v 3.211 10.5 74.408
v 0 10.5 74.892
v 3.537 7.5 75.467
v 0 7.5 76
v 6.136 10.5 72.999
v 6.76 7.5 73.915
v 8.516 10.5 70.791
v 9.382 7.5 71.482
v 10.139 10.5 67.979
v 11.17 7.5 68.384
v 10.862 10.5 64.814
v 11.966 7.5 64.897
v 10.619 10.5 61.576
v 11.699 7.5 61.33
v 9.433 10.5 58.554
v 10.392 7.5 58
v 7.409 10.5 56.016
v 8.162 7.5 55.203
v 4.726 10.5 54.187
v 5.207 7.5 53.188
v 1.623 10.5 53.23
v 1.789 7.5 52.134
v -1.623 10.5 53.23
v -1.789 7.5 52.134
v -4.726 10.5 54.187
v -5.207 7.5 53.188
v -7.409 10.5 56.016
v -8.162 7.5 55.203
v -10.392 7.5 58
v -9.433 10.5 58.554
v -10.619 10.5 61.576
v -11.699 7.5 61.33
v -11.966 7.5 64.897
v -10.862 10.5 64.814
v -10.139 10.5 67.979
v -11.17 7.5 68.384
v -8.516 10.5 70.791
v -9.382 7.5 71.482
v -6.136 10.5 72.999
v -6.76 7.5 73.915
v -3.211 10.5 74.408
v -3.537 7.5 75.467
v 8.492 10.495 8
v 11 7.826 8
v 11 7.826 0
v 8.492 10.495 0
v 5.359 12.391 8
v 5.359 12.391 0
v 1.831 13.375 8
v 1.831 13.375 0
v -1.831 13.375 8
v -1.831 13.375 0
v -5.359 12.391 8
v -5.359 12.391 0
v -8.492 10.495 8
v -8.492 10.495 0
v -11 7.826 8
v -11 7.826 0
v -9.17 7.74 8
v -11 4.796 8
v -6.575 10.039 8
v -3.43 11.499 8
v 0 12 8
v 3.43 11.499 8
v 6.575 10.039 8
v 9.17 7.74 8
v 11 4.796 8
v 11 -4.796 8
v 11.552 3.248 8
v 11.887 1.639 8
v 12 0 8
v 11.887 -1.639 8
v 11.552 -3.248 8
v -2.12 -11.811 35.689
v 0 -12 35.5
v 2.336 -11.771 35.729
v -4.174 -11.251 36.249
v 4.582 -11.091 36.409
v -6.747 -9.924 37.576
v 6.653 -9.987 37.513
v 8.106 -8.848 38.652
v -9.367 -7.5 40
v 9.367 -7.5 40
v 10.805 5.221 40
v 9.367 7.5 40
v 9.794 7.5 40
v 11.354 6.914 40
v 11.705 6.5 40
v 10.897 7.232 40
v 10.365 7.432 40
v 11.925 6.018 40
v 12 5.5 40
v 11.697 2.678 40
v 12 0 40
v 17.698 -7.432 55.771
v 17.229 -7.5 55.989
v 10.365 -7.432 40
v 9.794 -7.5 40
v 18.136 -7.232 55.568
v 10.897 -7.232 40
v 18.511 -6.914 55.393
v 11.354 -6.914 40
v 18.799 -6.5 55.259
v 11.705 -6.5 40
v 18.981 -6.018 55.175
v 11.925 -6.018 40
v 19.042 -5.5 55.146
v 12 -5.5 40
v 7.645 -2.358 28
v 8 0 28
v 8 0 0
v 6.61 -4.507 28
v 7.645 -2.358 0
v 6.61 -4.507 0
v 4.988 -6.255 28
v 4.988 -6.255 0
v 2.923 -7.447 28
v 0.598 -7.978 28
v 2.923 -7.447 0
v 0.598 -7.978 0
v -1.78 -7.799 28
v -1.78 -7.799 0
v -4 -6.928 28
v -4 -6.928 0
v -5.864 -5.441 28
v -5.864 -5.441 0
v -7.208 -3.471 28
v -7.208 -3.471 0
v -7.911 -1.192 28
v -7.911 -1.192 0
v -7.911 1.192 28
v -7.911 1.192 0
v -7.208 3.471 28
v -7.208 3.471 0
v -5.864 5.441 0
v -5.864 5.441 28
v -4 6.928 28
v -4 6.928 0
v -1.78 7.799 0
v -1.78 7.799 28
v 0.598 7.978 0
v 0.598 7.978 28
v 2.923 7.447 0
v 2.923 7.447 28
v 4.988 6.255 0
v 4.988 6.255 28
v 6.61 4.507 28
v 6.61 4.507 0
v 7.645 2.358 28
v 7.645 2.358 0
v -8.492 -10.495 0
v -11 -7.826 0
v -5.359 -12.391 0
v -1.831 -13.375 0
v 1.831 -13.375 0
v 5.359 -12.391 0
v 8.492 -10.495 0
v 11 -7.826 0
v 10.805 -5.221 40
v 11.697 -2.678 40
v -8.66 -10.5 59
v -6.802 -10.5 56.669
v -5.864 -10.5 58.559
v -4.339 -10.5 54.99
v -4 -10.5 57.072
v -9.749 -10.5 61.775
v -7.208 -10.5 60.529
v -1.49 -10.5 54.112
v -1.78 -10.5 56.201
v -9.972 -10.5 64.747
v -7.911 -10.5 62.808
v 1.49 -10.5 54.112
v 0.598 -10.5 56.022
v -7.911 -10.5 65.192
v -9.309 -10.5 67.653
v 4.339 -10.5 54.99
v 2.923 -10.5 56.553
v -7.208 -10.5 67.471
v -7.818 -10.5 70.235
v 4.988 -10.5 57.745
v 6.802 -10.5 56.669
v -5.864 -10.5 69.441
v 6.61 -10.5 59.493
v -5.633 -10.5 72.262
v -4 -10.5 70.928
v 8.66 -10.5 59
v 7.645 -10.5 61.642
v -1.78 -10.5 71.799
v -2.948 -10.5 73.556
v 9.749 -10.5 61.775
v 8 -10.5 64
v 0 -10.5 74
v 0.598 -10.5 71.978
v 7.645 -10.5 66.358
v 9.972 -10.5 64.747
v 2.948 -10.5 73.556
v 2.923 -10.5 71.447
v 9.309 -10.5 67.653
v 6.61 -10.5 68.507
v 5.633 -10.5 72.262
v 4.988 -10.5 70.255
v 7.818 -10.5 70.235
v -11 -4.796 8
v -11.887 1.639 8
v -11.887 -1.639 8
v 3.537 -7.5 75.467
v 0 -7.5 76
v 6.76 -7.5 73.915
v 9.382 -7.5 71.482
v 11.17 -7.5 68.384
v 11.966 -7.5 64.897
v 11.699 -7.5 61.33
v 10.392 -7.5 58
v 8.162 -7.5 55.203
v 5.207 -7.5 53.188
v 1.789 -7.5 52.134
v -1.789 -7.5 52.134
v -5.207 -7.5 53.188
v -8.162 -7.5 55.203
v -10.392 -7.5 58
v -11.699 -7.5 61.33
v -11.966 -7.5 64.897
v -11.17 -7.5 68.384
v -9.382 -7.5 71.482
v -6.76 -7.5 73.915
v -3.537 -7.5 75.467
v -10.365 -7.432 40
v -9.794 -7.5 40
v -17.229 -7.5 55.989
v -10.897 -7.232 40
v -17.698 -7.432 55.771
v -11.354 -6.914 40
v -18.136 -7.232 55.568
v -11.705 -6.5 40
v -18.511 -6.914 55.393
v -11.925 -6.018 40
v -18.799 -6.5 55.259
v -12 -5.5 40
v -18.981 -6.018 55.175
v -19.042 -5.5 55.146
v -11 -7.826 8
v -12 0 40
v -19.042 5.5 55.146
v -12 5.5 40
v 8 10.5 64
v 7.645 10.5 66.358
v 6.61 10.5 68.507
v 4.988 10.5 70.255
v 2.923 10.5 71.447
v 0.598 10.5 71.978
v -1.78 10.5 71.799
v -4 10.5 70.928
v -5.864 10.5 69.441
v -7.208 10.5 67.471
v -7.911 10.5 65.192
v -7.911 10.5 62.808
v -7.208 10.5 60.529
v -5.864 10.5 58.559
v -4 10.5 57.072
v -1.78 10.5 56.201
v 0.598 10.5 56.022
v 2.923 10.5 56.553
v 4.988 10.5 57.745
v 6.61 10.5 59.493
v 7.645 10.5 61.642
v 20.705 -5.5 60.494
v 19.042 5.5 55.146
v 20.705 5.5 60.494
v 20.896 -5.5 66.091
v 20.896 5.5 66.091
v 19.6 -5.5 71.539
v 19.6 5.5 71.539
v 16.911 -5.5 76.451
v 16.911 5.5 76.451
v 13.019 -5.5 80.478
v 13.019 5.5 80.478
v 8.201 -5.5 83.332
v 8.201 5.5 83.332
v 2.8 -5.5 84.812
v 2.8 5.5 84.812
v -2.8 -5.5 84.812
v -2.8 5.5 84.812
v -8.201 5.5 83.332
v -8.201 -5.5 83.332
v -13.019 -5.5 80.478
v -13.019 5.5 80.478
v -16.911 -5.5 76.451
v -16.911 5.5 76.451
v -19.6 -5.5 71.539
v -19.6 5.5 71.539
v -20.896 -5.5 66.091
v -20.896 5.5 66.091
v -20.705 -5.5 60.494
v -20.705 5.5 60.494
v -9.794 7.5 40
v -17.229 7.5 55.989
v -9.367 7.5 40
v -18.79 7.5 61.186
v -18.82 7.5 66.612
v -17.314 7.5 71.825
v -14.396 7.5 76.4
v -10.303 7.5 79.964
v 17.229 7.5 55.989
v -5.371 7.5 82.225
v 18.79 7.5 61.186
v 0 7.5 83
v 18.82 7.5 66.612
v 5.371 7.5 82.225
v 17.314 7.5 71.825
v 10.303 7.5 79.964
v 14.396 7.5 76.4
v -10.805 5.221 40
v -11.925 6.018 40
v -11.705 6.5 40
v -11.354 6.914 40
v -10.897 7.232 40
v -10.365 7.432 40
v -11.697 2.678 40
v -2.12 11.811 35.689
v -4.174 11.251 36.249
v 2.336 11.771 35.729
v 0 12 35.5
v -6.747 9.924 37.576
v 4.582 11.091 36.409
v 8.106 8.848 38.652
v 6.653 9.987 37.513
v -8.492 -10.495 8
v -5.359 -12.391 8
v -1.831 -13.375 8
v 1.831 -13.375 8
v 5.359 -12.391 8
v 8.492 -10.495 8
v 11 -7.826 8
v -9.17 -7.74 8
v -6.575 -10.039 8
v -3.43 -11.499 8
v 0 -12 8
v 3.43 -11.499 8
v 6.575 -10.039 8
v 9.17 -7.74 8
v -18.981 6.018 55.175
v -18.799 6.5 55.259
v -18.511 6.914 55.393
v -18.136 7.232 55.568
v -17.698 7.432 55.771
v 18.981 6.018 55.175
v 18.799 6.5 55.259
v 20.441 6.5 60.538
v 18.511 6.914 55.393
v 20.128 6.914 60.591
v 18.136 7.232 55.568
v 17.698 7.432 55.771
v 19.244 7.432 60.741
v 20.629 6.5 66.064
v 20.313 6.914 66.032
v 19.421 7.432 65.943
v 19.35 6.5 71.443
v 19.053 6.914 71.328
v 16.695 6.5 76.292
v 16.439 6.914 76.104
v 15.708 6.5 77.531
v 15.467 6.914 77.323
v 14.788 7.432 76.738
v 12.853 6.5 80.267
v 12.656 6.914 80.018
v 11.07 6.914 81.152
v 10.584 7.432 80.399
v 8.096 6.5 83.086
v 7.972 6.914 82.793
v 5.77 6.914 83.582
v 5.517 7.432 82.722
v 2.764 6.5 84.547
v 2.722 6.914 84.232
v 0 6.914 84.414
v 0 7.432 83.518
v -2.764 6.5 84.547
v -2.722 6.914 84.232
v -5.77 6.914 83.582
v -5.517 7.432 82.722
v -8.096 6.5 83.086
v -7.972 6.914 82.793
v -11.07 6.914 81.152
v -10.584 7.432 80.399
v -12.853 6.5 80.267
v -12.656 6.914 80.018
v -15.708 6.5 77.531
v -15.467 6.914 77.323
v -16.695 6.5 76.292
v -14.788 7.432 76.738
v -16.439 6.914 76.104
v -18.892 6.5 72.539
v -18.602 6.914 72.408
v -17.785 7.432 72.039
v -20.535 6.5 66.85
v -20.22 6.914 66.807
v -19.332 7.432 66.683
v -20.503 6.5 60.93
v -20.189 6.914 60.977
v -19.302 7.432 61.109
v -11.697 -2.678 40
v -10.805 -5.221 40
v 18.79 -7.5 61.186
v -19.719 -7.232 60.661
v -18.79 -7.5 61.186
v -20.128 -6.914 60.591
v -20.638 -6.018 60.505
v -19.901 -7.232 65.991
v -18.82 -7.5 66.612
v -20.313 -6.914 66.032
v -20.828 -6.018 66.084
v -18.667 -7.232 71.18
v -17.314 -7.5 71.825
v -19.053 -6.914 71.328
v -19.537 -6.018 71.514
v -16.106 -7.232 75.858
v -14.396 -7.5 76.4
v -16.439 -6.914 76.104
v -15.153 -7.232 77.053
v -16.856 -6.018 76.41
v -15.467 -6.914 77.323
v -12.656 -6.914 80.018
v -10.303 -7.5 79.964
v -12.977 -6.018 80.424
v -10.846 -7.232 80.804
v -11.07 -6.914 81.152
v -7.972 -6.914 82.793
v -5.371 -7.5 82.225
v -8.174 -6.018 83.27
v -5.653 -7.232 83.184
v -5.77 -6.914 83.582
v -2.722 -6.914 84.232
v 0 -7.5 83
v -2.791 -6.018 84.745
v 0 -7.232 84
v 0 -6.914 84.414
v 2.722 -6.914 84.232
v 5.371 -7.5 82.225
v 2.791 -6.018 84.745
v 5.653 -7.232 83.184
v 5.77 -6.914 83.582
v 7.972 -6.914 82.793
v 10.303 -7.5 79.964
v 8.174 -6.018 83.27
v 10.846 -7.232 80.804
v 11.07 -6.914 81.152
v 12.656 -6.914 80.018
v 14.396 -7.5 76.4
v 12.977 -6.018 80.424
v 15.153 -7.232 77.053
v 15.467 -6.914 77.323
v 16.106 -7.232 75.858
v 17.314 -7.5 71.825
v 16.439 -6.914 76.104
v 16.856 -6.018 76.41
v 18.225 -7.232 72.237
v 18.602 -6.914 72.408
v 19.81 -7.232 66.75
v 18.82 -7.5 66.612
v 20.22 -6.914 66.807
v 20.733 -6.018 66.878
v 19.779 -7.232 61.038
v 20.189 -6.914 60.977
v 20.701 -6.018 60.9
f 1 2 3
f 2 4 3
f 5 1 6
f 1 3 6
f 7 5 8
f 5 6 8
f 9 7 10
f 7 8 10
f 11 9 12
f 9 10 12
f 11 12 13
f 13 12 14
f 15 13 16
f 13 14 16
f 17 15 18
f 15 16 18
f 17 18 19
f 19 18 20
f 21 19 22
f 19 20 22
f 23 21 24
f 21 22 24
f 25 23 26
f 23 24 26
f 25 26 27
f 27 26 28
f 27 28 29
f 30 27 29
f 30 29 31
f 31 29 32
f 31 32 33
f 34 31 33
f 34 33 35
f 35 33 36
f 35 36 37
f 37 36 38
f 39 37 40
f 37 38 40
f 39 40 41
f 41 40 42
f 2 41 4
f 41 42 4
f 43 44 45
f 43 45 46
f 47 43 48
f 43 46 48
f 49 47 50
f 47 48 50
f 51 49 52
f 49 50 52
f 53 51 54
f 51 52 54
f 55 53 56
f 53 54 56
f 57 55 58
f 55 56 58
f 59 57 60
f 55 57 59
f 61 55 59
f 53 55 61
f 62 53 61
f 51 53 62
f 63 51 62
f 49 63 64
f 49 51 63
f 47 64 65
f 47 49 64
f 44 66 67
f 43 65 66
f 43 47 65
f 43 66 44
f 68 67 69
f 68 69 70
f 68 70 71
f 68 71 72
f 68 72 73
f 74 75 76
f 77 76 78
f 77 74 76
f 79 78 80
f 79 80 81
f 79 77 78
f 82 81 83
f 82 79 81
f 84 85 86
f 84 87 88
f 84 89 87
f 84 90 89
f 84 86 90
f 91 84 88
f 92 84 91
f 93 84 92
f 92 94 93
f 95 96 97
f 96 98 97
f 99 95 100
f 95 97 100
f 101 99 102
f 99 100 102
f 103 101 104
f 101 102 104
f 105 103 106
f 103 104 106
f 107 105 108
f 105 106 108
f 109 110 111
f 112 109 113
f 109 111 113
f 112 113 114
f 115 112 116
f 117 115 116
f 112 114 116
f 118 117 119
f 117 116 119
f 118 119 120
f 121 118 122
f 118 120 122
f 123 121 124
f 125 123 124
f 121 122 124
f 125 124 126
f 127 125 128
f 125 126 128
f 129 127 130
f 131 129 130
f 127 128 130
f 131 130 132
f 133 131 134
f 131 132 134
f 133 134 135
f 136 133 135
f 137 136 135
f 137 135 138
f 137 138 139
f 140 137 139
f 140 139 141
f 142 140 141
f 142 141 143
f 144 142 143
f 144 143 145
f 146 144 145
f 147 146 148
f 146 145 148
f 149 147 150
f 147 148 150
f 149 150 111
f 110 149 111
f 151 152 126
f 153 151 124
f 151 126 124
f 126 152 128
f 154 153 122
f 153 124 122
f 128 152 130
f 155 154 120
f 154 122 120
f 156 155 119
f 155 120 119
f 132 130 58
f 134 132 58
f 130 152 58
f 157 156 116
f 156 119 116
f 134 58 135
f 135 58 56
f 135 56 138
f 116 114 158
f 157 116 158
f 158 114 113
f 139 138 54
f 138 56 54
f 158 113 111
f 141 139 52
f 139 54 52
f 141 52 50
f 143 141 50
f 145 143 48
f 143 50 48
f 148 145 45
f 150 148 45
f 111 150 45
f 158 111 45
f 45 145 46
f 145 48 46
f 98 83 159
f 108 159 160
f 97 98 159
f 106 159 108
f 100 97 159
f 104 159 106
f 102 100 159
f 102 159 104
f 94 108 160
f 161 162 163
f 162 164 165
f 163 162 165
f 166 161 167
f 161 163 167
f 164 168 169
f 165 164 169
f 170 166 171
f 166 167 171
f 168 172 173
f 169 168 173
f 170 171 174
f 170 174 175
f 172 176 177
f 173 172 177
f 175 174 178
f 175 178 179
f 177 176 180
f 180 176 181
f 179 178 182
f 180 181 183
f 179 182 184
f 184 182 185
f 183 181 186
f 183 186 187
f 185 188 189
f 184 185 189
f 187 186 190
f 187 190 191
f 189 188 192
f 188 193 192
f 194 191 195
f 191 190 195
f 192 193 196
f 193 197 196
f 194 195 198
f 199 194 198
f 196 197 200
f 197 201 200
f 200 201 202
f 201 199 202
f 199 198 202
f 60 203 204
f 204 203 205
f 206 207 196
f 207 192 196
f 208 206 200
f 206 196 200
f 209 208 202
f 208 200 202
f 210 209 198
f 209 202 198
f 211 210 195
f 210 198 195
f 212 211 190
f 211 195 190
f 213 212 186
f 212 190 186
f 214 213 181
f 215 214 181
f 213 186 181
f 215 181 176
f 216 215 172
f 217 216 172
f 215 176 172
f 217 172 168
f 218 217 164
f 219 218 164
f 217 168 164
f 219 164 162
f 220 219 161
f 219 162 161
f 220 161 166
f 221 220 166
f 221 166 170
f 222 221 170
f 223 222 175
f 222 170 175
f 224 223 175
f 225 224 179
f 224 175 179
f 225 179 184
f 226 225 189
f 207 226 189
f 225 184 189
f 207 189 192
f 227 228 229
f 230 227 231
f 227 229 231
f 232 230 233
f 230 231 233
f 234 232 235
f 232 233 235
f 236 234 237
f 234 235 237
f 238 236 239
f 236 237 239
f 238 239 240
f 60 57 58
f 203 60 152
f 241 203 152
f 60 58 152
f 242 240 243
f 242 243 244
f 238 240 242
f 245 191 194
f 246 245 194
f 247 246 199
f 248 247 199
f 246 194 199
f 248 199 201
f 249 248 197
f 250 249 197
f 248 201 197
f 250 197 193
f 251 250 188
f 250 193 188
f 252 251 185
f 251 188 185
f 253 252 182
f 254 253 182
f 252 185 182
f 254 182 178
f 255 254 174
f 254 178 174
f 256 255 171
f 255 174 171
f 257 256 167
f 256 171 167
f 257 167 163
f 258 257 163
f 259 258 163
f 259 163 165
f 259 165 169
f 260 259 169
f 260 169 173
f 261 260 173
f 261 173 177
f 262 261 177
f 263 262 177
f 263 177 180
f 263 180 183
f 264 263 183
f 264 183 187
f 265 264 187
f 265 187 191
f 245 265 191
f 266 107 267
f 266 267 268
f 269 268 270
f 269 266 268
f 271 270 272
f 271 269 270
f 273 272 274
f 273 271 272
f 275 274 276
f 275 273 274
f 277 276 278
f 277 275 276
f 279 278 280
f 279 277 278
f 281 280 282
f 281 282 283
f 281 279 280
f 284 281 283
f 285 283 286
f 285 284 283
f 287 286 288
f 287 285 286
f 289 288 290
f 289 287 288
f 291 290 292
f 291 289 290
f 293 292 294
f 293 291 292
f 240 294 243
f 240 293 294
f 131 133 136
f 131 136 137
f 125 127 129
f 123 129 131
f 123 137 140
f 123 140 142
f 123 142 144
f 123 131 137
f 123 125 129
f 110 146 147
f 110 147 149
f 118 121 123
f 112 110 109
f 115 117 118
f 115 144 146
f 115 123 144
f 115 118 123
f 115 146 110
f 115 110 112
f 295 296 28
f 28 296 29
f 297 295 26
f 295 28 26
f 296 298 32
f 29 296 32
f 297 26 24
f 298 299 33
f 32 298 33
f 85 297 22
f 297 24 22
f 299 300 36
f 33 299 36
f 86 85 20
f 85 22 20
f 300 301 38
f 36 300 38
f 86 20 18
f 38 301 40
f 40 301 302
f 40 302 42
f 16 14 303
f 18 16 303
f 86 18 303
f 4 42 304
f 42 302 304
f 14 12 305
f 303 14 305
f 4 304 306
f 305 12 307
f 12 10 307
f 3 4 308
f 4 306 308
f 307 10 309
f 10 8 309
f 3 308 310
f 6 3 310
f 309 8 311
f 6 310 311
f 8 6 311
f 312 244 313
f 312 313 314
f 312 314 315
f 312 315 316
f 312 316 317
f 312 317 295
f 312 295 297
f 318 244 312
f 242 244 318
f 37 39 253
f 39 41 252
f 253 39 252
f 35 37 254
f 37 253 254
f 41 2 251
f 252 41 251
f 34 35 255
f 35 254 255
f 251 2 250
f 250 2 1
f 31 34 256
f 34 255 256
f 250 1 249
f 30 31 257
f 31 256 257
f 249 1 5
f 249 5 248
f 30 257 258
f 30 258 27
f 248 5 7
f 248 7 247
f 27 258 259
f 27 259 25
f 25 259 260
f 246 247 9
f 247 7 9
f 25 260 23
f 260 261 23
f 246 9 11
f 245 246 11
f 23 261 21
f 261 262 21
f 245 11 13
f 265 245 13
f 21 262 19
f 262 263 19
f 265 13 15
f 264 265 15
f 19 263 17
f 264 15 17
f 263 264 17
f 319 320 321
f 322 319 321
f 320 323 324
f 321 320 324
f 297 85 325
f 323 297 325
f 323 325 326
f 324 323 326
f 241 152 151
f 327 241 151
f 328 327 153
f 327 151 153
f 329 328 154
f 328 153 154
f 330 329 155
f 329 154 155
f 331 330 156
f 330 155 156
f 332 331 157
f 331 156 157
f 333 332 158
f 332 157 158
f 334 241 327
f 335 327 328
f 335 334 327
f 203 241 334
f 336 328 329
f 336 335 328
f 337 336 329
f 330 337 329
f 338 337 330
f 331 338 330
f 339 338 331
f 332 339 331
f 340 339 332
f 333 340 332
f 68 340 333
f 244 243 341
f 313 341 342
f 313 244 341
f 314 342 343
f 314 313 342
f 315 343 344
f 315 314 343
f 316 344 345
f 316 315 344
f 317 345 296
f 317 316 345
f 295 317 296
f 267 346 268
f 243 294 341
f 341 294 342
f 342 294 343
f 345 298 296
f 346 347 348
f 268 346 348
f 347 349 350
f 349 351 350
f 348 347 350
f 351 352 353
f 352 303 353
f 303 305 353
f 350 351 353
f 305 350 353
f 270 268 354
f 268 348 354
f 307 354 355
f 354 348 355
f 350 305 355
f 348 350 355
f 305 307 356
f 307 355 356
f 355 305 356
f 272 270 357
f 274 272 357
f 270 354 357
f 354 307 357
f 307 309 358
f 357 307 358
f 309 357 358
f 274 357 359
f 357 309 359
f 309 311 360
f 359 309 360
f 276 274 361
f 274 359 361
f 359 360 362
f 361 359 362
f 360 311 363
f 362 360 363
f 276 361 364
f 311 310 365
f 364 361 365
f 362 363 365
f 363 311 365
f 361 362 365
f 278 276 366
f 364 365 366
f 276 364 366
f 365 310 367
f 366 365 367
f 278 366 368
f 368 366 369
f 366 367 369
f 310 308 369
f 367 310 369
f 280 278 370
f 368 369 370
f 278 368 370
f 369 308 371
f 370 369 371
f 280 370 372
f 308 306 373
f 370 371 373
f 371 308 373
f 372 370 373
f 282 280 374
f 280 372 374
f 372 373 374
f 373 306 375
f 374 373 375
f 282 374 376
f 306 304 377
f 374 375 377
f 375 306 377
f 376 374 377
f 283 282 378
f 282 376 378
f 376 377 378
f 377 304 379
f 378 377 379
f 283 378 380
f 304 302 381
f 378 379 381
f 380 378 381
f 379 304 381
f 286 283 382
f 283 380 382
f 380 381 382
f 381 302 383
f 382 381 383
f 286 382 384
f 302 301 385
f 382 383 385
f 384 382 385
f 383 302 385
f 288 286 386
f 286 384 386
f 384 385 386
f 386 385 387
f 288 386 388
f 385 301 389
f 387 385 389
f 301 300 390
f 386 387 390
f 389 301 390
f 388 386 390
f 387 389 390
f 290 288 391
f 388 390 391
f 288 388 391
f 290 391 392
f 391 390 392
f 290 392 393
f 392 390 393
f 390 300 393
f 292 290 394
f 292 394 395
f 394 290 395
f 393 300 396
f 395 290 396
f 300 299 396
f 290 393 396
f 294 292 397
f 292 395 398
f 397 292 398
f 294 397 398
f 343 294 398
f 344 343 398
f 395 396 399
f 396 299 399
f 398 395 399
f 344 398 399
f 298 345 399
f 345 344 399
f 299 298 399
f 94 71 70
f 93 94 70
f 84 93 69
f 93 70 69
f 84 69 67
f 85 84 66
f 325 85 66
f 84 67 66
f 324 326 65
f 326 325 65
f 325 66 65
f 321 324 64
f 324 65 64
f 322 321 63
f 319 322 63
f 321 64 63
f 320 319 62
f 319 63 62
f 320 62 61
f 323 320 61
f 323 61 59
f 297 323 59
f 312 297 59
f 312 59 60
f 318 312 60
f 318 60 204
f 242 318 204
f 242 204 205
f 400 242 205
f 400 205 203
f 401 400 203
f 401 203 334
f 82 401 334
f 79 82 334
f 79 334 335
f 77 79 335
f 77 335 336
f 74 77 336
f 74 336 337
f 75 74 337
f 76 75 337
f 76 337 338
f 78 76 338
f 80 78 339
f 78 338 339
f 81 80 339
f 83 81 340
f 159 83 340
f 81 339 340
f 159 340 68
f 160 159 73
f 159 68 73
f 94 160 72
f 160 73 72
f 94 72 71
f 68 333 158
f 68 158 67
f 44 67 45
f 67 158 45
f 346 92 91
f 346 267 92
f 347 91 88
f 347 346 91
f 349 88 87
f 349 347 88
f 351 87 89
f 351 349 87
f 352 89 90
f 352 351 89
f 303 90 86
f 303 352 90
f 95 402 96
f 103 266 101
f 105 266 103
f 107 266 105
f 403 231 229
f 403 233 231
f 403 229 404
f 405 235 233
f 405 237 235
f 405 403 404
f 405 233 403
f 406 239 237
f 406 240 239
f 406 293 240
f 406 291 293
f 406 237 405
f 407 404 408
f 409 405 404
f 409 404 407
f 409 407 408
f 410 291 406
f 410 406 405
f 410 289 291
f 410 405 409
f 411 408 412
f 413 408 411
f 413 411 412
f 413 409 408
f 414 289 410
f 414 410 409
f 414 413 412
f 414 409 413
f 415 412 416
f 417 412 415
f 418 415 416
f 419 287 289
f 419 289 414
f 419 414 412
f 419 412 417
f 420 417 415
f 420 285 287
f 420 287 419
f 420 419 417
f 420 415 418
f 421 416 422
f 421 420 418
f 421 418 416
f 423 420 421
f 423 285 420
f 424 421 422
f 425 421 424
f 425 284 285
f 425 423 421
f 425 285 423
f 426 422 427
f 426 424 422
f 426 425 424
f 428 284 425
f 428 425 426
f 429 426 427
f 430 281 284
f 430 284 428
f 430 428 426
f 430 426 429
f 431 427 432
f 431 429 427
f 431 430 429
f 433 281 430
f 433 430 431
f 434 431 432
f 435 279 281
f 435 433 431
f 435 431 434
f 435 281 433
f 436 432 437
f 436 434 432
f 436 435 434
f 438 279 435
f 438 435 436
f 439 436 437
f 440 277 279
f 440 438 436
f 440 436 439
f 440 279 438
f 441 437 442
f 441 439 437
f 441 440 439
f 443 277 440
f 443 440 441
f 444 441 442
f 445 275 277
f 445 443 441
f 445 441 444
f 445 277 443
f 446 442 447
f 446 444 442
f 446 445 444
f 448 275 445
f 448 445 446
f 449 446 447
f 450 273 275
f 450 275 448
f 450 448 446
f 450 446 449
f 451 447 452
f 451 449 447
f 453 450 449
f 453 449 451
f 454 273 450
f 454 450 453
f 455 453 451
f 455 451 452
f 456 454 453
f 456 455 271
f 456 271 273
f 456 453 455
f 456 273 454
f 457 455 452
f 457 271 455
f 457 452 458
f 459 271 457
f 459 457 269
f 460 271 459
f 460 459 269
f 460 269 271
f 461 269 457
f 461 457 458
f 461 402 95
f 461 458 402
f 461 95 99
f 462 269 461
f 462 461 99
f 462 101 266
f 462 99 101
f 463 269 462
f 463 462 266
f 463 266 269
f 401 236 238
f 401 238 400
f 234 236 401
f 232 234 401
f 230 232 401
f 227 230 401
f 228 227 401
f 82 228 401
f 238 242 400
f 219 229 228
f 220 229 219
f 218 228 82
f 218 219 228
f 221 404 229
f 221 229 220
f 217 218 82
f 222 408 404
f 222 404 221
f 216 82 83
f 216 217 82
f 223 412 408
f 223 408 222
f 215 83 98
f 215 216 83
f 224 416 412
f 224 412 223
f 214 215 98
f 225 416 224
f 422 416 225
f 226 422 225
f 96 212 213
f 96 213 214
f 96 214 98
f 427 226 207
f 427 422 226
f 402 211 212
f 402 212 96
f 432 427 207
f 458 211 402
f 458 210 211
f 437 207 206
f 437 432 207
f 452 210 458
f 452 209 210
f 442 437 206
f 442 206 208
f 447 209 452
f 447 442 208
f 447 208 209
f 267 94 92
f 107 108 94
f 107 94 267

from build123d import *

# Parameters (mm, degrees)
F0_R      = 12
F1_DEPTH  = 64
F2_R      = 13.5
F3_DEPTH  = 8
F5_DEPTH  = 7.5
F7_DEPTH  = 12.5
F10_R     = 8
F11_DEPTH = 24.001
F12_R     = 2
F13_R     = 8
F14_DEPTH = 28
F16_DEPTH = 8


with BuildPart() as f1:
    # F0 (on Top) → F1 (new body)
    with BuildSketch(Plane.XY):
        Circle(F0_R)
    extrude(amount=F1_DEPTH)

    # F2 (on Top) → F3 (join)
    with BuildSketch(Plane.XY):
        Circle(F2_R)
    extrude(amount=F3_DEPTH)

    # F4 (on Front) → F5 (join, symmetric)
    with BuildSketch(Plane.XZ):
        with BuildLine():
            Line((12, 40), (19.042305, 55.146153))
            ThreePointArc((19.042305, 55.146153), (0, 85), (-19.042305, 55.146153))
            Line((-19.042305, 55.146153), (-12, 40))
            Line((-12, 40), (12, 40))
        make_face()
    extrude(amount=F5_DEPTH, both=True)

    # F6 (on Right) → F7 (cut, symmetric)
    with BuildSketch(Plane.YZ):
        Polygon((-7.5, 40), (-7.5, 64), (-12, 64), (-12, 35.5), align=None)
        Polygon((12, 64), (7.5, 64), (7.5, 40), (12, 35.5), align=None)
    extrude(amount=F7_DEPTH, both=True, mode=Mode.SUBTRACT)

    # F8 (on Right) → F9 (revolve)
    with BuildSketch(Plane.YZ):
        Polygon((-10.5, 74), (-10.5, 64), (10.5, 64), (10.5, 74.892095), (7.5, 76), (-7.5, 76), align=None)
    revolve(axis=Axis((0, 1.309478, 64), (0, 1, 0)))

    # F10 (on face) → F11 (cut, through all)
    with BuildSketch(Plane.XZ.offset(10.5)):
        with Locations((0, 64)):
            Circle(F10_R)
    extrude(amount=-F11_DEPTH, mode=Mode.SUBTRACT)

    # F12
    f12_edges = [f1.edges().sort_by_distance(p)[0] for p in [
        (15.521153, -7.5, 47.573076),
        (15.521153, 7.5, 47.573076),
    ]]
    fillet(f12_edges, radius=F12_R)

    # F13 (on face) → F14 (cut)
    with BuildSketch(Plane(origin=(0, 0, 0), x_dir=(1, 0, 0), z_dir=(0, 0, -1))):
        Circle(F13_R)
    extrude(amount=-F14_DEPTH, mode=Mode.SUBTRACT)

    # F15 (on face) → F16 (cut, through all)
    with BuildSketch(Plane(origin=(0, 0, 0), x_dir=(1, 0, 0), z_dir=(0, 0, -1))):
        with BuildLine():
            Line((-11, -7.826238), (-11, 7.826238))
            ThreePointArc((-11, 7.826238), (-13.5, 0), (-11, -7.826238))
        make_face()
        with BuildLine():
            Line((11, 7.826238), (11, -7.826238))
            ThreePointArc((11, -7.826238), (13.5, 0), (11, 7.826238))
        make_face()
    extrude(amount=-F16_DEPTH, mode=Mode.SUBTRACT)


solid = f1.part
